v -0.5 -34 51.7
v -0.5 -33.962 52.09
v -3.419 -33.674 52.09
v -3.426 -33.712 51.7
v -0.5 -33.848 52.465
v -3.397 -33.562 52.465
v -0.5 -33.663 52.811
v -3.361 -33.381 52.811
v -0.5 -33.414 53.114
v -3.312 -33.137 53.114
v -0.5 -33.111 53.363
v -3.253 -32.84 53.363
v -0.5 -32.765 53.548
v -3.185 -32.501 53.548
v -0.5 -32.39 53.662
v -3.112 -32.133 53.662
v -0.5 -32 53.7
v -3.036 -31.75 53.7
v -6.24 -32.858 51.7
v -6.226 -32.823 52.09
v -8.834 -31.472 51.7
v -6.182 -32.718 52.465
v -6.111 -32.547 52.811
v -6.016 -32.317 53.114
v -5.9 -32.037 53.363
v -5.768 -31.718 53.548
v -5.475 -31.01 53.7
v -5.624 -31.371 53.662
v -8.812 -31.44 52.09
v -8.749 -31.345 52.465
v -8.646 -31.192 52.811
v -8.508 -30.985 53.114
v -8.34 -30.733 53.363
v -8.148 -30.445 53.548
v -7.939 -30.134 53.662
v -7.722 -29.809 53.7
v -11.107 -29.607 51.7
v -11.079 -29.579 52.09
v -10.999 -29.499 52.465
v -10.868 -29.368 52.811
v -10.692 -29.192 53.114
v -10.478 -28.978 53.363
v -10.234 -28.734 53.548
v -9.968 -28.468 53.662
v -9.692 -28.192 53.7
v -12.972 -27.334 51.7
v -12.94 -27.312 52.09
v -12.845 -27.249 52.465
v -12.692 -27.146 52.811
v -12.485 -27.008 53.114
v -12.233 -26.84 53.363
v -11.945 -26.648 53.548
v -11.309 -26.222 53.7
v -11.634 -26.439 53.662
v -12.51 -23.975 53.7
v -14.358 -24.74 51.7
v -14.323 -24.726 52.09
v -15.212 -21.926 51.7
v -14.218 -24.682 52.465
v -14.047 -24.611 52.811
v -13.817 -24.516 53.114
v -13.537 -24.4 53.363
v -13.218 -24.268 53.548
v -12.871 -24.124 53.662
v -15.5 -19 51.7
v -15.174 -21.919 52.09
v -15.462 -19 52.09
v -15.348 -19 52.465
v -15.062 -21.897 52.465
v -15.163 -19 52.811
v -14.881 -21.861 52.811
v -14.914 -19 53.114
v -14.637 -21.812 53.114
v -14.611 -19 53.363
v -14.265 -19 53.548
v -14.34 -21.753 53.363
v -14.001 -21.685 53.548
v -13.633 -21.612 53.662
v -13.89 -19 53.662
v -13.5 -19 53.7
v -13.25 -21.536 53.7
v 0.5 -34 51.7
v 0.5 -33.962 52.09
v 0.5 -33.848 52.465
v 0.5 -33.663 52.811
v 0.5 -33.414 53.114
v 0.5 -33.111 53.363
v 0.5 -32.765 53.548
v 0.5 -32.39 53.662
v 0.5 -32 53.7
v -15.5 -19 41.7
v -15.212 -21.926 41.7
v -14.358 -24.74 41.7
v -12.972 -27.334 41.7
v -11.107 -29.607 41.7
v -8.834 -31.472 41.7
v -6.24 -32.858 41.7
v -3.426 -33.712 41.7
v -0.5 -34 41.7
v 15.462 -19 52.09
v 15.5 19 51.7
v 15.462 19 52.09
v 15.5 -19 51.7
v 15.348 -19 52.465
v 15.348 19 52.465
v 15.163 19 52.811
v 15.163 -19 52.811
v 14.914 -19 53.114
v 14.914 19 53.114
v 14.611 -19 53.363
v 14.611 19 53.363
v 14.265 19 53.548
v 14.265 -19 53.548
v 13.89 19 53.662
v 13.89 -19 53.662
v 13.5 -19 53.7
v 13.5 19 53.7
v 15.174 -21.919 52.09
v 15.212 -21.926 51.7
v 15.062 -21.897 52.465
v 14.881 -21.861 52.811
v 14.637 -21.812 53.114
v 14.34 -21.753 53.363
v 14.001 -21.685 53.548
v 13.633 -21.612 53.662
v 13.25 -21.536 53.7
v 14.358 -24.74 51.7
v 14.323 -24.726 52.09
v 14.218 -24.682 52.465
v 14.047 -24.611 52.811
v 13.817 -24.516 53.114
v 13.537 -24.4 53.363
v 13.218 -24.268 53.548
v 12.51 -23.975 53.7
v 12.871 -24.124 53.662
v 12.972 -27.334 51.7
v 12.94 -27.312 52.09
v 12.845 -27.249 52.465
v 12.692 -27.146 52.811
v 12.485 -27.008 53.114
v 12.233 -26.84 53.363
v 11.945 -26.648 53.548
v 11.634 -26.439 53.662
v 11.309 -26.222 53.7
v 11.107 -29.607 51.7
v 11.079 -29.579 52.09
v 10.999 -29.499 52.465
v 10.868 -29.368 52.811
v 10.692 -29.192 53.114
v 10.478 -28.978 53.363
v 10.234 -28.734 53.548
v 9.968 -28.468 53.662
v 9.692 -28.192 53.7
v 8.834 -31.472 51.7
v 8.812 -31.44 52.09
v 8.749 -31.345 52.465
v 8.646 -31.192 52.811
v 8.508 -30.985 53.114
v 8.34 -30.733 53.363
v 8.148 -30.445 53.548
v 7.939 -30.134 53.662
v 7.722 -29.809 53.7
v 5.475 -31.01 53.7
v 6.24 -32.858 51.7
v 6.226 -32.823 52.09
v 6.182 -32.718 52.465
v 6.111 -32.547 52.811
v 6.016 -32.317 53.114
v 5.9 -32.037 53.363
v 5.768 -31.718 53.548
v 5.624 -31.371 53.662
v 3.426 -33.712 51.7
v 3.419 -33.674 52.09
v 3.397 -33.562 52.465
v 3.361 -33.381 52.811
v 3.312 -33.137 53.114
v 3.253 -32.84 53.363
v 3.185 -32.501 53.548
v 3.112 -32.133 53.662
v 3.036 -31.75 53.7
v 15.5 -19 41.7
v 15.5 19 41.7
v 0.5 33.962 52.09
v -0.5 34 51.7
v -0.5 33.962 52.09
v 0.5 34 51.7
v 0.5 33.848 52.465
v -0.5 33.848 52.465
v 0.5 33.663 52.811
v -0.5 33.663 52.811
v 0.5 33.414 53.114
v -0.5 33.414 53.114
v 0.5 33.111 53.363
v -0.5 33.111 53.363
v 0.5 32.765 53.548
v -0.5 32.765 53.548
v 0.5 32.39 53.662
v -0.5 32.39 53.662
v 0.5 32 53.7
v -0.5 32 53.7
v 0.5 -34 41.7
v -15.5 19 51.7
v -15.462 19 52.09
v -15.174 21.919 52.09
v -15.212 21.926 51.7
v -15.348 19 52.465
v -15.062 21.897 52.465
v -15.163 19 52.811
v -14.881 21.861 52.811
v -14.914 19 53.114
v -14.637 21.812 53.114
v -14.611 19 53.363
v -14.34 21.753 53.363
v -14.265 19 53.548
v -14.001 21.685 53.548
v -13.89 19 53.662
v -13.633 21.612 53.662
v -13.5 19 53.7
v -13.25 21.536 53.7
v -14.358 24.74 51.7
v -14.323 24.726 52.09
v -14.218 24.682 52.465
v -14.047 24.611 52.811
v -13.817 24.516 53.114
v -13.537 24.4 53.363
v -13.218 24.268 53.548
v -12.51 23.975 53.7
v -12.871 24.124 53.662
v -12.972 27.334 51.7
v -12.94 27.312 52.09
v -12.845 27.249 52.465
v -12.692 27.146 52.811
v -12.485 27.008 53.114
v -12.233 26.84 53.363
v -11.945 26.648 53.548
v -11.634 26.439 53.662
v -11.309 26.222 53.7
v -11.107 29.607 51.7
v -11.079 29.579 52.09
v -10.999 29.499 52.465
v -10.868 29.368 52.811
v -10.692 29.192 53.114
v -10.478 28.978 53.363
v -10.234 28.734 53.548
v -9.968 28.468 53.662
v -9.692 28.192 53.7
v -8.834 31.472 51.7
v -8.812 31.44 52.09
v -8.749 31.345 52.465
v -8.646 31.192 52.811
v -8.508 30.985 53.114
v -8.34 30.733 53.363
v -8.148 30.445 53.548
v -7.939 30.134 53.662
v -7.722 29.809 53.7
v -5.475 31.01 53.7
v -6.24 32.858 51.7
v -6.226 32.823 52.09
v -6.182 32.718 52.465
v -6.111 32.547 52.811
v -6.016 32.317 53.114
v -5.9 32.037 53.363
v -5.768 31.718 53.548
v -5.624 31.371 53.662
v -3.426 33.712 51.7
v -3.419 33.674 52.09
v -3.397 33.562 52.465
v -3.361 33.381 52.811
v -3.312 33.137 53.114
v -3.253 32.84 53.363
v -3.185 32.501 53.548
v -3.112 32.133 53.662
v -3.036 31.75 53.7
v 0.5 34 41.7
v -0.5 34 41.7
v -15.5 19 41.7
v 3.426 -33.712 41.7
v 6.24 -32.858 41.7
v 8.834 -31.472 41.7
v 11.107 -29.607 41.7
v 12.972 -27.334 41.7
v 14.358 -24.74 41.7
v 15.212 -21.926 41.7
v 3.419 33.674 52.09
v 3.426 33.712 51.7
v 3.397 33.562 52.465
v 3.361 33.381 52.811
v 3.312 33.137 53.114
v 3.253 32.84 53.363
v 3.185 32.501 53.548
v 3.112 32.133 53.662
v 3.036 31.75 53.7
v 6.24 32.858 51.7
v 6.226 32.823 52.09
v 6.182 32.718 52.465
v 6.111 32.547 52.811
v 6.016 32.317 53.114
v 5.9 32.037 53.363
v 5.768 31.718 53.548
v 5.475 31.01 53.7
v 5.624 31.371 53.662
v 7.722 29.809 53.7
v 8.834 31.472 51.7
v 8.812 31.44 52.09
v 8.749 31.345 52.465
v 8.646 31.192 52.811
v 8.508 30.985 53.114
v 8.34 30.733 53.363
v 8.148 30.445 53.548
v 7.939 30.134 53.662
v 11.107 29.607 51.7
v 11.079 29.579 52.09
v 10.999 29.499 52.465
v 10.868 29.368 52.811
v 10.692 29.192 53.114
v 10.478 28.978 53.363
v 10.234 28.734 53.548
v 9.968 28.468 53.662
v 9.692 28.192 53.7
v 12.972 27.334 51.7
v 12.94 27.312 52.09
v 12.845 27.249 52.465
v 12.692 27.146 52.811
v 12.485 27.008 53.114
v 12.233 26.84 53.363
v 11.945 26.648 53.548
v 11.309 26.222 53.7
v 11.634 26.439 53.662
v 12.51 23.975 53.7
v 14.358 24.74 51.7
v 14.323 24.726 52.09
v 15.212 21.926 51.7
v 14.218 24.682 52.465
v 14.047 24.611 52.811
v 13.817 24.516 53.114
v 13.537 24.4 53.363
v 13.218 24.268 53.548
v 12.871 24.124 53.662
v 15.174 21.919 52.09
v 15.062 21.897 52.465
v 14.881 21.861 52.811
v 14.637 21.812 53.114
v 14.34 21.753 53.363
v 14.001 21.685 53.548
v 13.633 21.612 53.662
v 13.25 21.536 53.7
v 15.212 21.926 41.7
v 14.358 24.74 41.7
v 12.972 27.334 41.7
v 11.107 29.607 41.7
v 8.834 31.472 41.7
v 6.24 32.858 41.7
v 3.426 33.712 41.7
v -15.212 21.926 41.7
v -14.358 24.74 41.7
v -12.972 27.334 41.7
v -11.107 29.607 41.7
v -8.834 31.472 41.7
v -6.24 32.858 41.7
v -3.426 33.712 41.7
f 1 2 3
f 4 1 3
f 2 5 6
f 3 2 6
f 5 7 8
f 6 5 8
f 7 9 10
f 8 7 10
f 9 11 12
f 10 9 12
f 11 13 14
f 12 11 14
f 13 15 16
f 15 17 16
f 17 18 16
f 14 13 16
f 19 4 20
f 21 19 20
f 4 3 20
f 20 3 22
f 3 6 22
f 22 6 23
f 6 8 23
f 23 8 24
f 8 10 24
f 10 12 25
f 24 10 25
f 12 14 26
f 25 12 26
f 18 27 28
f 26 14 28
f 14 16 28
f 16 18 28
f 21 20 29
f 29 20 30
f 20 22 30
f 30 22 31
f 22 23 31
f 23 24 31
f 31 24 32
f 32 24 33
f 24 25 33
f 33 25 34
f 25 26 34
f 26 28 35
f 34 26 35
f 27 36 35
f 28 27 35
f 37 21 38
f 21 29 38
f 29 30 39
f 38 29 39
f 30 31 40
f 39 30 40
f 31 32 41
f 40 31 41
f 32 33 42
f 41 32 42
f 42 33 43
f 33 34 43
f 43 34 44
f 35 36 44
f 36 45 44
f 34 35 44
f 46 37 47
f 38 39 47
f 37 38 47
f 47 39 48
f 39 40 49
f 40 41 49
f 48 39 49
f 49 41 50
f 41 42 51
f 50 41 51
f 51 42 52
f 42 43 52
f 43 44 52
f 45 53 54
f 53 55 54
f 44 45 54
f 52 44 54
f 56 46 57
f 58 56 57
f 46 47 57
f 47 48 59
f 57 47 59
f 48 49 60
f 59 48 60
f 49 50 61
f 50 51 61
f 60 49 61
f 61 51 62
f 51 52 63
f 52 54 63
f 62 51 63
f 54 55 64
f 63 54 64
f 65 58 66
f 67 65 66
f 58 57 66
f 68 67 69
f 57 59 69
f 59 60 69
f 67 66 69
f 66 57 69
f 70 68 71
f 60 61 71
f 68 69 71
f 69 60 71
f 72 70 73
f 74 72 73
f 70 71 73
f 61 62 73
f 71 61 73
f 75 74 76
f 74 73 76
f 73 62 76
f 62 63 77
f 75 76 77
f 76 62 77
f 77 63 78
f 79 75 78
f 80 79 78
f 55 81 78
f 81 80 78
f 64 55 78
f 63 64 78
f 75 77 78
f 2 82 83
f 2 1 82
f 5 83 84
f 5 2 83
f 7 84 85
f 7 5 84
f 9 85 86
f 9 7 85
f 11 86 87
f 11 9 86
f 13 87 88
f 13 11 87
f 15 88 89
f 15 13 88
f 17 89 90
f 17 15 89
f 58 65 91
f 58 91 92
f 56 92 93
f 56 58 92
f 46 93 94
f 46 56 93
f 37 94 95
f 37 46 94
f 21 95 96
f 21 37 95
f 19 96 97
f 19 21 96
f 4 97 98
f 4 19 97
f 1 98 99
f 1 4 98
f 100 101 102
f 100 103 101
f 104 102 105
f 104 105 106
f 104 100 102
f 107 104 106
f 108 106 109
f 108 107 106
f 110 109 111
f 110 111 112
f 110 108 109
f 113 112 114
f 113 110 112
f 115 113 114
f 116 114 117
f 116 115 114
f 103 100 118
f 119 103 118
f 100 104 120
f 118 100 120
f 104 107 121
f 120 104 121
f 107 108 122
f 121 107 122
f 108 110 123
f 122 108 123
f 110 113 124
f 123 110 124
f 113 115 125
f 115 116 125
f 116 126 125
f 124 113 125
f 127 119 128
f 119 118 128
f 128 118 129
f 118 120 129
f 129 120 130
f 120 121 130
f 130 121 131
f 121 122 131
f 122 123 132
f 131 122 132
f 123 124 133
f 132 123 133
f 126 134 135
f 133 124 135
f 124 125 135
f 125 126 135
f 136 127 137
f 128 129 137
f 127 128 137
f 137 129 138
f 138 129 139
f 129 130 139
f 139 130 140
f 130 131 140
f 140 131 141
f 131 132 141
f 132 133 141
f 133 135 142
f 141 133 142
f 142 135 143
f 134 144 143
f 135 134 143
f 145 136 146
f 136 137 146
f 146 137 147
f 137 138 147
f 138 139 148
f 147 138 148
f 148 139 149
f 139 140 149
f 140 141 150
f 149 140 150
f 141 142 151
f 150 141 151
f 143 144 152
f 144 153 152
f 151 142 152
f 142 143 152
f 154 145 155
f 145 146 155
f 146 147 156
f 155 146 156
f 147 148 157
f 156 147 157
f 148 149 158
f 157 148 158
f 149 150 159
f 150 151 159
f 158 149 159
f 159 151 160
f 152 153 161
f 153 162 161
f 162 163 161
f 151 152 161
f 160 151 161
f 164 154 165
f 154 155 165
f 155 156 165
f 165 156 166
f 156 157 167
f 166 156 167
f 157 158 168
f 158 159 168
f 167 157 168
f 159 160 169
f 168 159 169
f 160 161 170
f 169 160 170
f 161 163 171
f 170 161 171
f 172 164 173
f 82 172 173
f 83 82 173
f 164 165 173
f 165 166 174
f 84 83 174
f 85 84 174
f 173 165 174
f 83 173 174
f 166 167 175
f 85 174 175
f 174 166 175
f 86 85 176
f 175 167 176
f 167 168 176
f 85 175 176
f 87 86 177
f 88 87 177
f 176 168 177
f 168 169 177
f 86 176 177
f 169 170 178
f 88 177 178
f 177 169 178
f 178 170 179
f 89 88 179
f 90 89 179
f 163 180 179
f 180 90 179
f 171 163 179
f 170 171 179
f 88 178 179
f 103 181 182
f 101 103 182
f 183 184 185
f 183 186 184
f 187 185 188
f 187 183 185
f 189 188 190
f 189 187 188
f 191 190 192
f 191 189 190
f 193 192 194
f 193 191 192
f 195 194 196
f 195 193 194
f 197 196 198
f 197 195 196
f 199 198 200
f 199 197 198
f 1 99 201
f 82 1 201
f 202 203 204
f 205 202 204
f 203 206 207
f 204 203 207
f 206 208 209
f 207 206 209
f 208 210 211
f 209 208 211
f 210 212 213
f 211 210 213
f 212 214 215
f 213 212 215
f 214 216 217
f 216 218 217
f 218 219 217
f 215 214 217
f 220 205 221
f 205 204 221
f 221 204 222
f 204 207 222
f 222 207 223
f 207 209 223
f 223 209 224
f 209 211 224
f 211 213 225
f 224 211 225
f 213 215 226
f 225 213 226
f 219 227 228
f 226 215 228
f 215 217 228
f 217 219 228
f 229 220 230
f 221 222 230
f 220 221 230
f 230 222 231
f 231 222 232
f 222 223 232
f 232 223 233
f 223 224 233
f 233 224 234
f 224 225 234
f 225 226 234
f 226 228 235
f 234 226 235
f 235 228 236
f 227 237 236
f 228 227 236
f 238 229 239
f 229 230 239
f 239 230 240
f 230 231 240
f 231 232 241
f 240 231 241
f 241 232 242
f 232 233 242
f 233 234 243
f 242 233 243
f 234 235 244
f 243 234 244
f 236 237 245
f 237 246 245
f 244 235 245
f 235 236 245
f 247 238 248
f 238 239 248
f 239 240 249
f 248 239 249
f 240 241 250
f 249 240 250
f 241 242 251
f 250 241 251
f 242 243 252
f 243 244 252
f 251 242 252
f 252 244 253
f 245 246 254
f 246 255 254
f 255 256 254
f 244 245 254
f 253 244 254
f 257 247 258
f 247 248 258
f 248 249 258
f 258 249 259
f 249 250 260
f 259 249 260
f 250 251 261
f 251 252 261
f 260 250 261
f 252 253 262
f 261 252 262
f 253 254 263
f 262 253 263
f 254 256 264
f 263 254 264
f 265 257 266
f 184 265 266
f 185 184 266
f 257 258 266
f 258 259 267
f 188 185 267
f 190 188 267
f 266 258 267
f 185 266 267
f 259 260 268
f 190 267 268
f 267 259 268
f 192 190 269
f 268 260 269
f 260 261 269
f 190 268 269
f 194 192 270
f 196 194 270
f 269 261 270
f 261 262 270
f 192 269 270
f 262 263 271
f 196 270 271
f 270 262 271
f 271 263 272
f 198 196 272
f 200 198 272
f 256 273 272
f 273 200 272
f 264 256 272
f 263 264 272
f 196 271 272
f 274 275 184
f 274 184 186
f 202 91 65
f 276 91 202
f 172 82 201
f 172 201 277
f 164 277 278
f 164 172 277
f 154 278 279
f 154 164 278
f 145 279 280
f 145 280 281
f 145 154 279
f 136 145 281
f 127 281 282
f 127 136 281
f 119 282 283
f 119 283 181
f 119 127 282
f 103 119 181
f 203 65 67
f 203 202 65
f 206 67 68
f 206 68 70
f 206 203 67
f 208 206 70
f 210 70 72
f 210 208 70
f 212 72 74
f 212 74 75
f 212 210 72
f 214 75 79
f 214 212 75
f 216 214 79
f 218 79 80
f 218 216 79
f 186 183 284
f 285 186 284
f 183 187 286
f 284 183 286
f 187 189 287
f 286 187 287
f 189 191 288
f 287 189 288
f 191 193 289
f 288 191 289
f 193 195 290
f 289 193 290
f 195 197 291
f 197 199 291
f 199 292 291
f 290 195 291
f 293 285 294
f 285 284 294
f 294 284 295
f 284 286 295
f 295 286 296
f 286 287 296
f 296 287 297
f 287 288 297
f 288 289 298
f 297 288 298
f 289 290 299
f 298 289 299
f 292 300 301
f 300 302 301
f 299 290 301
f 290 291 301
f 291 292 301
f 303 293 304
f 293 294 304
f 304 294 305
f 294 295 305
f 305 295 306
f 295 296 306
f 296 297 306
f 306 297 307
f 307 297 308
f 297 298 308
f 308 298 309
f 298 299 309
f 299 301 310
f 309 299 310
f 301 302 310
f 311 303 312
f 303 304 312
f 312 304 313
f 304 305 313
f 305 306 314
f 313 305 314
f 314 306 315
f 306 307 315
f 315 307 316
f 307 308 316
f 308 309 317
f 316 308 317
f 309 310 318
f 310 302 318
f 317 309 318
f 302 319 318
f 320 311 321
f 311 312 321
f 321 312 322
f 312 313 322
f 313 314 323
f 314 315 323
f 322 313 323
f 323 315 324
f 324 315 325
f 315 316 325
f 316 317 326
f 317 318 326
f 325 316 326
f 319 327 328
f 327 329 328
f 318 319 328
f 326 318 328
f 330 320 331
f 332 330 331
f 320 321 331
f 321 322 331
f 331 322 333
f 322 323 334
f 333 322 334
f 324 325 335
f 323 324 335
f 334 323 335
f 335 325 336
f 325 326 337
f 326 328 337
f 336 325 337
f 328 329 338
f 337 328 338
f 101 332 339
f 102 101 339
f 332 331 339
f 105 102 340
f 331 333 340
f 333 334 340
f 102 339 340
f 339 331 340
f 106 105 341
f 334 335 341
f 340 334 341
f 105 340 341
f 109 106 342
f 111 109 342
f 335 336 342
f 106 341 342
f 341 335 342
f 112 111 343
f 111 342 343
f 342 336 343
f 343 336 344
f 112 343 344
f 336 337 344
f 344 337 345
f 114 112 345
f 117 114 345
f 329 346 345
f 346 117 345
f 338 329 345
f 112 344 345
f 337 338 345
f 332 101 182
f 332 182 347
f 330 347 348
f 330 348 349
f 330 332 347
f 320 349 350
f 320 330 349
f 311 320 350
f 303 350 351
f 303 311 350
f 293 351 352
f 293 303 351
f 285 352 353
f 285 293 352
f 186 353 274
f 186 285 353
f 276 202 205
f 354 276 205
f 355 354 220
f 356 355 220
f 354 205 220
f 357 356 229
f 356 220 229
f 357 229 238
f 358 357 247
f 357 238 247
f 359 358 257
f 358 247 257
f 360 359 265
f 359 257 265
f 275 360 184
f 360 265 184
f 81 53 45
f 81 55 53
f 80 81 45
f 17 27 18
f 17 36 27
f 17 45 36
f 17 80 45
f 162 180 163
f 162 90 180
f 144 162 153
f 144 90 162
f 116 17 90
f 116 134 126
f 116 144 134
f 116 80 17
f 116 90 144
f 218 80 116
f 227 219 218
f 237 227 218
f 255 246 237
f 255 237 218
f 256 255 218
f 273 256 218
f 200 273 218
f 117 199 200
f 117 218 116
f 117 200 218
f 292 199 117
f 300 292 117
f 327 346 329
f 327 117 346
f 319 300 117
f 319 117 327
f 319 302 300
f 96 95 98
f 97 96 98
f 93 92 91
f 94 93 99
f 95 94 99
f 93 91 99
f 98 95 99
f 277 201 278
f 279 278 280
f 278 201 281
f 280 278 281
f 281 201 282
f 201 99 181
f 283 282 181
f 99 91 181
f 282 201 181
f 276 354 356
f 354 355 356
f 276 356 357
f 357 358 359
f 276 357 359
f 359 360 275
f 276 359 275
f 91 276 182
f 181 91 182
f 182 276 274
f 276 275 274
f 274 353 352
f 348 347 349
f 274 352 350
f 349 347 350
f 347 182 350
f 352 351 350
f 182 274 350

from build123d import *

# Parameters (mm, degrees)
BOX018_W     = 31
BOX018_H     = 68
BOX018_DEPTH = 12
FILLET010_R  = 15
FILLET011_R  = 2


with BuildPart() as part:
    # Box018 → Box018 (new body)
    with BuildSketch(Plane(origin=(-15.5, -34, 1.7), x_dir=(1, 0, 0), z_dir=(0, 0, 1))):
        with Locations((15.5, 34)):
            Rectangle(BOX018_W, BOX018_H)
    extrude(amount=BOX018_DEPTH)

    # Fillet010
    fillet010_edges = [part.edges().sort_by_distance(p)[0] for p in [
        (-15.5, -34, 7.7),
        (-15.5, 34, 7.7),
        (15.5, -34, 7.7),
        (15.5, 34, 7.7),
    ]]
    fillet(fillet010_edges, radius=FILLET010_R)

    # Fillet011
    fillet011_edges = [part.edges().sort_by_distance(p)[0] for p in [
        (-15.5, 0, 13.7),
        (-11.106602, -29.606602, 13.7),
        (-11.106602, 29.606602, 13.7),
        (0, -34, 13.7),
        (0, 34, 13.7),
        (11.106602, -29.606602, 13.7),
        (11.106602, 29.606602, 13.7),
        (15.5, 0, 13.7),
    ]]
    fillet(fillet011_edges, radius=FILLET011_R)


with BuildPart() as part_1:
    # Fillet011 placement: moved
    add(part.part.moved(Location((0, 0, 40))))


solid = part_1.part
